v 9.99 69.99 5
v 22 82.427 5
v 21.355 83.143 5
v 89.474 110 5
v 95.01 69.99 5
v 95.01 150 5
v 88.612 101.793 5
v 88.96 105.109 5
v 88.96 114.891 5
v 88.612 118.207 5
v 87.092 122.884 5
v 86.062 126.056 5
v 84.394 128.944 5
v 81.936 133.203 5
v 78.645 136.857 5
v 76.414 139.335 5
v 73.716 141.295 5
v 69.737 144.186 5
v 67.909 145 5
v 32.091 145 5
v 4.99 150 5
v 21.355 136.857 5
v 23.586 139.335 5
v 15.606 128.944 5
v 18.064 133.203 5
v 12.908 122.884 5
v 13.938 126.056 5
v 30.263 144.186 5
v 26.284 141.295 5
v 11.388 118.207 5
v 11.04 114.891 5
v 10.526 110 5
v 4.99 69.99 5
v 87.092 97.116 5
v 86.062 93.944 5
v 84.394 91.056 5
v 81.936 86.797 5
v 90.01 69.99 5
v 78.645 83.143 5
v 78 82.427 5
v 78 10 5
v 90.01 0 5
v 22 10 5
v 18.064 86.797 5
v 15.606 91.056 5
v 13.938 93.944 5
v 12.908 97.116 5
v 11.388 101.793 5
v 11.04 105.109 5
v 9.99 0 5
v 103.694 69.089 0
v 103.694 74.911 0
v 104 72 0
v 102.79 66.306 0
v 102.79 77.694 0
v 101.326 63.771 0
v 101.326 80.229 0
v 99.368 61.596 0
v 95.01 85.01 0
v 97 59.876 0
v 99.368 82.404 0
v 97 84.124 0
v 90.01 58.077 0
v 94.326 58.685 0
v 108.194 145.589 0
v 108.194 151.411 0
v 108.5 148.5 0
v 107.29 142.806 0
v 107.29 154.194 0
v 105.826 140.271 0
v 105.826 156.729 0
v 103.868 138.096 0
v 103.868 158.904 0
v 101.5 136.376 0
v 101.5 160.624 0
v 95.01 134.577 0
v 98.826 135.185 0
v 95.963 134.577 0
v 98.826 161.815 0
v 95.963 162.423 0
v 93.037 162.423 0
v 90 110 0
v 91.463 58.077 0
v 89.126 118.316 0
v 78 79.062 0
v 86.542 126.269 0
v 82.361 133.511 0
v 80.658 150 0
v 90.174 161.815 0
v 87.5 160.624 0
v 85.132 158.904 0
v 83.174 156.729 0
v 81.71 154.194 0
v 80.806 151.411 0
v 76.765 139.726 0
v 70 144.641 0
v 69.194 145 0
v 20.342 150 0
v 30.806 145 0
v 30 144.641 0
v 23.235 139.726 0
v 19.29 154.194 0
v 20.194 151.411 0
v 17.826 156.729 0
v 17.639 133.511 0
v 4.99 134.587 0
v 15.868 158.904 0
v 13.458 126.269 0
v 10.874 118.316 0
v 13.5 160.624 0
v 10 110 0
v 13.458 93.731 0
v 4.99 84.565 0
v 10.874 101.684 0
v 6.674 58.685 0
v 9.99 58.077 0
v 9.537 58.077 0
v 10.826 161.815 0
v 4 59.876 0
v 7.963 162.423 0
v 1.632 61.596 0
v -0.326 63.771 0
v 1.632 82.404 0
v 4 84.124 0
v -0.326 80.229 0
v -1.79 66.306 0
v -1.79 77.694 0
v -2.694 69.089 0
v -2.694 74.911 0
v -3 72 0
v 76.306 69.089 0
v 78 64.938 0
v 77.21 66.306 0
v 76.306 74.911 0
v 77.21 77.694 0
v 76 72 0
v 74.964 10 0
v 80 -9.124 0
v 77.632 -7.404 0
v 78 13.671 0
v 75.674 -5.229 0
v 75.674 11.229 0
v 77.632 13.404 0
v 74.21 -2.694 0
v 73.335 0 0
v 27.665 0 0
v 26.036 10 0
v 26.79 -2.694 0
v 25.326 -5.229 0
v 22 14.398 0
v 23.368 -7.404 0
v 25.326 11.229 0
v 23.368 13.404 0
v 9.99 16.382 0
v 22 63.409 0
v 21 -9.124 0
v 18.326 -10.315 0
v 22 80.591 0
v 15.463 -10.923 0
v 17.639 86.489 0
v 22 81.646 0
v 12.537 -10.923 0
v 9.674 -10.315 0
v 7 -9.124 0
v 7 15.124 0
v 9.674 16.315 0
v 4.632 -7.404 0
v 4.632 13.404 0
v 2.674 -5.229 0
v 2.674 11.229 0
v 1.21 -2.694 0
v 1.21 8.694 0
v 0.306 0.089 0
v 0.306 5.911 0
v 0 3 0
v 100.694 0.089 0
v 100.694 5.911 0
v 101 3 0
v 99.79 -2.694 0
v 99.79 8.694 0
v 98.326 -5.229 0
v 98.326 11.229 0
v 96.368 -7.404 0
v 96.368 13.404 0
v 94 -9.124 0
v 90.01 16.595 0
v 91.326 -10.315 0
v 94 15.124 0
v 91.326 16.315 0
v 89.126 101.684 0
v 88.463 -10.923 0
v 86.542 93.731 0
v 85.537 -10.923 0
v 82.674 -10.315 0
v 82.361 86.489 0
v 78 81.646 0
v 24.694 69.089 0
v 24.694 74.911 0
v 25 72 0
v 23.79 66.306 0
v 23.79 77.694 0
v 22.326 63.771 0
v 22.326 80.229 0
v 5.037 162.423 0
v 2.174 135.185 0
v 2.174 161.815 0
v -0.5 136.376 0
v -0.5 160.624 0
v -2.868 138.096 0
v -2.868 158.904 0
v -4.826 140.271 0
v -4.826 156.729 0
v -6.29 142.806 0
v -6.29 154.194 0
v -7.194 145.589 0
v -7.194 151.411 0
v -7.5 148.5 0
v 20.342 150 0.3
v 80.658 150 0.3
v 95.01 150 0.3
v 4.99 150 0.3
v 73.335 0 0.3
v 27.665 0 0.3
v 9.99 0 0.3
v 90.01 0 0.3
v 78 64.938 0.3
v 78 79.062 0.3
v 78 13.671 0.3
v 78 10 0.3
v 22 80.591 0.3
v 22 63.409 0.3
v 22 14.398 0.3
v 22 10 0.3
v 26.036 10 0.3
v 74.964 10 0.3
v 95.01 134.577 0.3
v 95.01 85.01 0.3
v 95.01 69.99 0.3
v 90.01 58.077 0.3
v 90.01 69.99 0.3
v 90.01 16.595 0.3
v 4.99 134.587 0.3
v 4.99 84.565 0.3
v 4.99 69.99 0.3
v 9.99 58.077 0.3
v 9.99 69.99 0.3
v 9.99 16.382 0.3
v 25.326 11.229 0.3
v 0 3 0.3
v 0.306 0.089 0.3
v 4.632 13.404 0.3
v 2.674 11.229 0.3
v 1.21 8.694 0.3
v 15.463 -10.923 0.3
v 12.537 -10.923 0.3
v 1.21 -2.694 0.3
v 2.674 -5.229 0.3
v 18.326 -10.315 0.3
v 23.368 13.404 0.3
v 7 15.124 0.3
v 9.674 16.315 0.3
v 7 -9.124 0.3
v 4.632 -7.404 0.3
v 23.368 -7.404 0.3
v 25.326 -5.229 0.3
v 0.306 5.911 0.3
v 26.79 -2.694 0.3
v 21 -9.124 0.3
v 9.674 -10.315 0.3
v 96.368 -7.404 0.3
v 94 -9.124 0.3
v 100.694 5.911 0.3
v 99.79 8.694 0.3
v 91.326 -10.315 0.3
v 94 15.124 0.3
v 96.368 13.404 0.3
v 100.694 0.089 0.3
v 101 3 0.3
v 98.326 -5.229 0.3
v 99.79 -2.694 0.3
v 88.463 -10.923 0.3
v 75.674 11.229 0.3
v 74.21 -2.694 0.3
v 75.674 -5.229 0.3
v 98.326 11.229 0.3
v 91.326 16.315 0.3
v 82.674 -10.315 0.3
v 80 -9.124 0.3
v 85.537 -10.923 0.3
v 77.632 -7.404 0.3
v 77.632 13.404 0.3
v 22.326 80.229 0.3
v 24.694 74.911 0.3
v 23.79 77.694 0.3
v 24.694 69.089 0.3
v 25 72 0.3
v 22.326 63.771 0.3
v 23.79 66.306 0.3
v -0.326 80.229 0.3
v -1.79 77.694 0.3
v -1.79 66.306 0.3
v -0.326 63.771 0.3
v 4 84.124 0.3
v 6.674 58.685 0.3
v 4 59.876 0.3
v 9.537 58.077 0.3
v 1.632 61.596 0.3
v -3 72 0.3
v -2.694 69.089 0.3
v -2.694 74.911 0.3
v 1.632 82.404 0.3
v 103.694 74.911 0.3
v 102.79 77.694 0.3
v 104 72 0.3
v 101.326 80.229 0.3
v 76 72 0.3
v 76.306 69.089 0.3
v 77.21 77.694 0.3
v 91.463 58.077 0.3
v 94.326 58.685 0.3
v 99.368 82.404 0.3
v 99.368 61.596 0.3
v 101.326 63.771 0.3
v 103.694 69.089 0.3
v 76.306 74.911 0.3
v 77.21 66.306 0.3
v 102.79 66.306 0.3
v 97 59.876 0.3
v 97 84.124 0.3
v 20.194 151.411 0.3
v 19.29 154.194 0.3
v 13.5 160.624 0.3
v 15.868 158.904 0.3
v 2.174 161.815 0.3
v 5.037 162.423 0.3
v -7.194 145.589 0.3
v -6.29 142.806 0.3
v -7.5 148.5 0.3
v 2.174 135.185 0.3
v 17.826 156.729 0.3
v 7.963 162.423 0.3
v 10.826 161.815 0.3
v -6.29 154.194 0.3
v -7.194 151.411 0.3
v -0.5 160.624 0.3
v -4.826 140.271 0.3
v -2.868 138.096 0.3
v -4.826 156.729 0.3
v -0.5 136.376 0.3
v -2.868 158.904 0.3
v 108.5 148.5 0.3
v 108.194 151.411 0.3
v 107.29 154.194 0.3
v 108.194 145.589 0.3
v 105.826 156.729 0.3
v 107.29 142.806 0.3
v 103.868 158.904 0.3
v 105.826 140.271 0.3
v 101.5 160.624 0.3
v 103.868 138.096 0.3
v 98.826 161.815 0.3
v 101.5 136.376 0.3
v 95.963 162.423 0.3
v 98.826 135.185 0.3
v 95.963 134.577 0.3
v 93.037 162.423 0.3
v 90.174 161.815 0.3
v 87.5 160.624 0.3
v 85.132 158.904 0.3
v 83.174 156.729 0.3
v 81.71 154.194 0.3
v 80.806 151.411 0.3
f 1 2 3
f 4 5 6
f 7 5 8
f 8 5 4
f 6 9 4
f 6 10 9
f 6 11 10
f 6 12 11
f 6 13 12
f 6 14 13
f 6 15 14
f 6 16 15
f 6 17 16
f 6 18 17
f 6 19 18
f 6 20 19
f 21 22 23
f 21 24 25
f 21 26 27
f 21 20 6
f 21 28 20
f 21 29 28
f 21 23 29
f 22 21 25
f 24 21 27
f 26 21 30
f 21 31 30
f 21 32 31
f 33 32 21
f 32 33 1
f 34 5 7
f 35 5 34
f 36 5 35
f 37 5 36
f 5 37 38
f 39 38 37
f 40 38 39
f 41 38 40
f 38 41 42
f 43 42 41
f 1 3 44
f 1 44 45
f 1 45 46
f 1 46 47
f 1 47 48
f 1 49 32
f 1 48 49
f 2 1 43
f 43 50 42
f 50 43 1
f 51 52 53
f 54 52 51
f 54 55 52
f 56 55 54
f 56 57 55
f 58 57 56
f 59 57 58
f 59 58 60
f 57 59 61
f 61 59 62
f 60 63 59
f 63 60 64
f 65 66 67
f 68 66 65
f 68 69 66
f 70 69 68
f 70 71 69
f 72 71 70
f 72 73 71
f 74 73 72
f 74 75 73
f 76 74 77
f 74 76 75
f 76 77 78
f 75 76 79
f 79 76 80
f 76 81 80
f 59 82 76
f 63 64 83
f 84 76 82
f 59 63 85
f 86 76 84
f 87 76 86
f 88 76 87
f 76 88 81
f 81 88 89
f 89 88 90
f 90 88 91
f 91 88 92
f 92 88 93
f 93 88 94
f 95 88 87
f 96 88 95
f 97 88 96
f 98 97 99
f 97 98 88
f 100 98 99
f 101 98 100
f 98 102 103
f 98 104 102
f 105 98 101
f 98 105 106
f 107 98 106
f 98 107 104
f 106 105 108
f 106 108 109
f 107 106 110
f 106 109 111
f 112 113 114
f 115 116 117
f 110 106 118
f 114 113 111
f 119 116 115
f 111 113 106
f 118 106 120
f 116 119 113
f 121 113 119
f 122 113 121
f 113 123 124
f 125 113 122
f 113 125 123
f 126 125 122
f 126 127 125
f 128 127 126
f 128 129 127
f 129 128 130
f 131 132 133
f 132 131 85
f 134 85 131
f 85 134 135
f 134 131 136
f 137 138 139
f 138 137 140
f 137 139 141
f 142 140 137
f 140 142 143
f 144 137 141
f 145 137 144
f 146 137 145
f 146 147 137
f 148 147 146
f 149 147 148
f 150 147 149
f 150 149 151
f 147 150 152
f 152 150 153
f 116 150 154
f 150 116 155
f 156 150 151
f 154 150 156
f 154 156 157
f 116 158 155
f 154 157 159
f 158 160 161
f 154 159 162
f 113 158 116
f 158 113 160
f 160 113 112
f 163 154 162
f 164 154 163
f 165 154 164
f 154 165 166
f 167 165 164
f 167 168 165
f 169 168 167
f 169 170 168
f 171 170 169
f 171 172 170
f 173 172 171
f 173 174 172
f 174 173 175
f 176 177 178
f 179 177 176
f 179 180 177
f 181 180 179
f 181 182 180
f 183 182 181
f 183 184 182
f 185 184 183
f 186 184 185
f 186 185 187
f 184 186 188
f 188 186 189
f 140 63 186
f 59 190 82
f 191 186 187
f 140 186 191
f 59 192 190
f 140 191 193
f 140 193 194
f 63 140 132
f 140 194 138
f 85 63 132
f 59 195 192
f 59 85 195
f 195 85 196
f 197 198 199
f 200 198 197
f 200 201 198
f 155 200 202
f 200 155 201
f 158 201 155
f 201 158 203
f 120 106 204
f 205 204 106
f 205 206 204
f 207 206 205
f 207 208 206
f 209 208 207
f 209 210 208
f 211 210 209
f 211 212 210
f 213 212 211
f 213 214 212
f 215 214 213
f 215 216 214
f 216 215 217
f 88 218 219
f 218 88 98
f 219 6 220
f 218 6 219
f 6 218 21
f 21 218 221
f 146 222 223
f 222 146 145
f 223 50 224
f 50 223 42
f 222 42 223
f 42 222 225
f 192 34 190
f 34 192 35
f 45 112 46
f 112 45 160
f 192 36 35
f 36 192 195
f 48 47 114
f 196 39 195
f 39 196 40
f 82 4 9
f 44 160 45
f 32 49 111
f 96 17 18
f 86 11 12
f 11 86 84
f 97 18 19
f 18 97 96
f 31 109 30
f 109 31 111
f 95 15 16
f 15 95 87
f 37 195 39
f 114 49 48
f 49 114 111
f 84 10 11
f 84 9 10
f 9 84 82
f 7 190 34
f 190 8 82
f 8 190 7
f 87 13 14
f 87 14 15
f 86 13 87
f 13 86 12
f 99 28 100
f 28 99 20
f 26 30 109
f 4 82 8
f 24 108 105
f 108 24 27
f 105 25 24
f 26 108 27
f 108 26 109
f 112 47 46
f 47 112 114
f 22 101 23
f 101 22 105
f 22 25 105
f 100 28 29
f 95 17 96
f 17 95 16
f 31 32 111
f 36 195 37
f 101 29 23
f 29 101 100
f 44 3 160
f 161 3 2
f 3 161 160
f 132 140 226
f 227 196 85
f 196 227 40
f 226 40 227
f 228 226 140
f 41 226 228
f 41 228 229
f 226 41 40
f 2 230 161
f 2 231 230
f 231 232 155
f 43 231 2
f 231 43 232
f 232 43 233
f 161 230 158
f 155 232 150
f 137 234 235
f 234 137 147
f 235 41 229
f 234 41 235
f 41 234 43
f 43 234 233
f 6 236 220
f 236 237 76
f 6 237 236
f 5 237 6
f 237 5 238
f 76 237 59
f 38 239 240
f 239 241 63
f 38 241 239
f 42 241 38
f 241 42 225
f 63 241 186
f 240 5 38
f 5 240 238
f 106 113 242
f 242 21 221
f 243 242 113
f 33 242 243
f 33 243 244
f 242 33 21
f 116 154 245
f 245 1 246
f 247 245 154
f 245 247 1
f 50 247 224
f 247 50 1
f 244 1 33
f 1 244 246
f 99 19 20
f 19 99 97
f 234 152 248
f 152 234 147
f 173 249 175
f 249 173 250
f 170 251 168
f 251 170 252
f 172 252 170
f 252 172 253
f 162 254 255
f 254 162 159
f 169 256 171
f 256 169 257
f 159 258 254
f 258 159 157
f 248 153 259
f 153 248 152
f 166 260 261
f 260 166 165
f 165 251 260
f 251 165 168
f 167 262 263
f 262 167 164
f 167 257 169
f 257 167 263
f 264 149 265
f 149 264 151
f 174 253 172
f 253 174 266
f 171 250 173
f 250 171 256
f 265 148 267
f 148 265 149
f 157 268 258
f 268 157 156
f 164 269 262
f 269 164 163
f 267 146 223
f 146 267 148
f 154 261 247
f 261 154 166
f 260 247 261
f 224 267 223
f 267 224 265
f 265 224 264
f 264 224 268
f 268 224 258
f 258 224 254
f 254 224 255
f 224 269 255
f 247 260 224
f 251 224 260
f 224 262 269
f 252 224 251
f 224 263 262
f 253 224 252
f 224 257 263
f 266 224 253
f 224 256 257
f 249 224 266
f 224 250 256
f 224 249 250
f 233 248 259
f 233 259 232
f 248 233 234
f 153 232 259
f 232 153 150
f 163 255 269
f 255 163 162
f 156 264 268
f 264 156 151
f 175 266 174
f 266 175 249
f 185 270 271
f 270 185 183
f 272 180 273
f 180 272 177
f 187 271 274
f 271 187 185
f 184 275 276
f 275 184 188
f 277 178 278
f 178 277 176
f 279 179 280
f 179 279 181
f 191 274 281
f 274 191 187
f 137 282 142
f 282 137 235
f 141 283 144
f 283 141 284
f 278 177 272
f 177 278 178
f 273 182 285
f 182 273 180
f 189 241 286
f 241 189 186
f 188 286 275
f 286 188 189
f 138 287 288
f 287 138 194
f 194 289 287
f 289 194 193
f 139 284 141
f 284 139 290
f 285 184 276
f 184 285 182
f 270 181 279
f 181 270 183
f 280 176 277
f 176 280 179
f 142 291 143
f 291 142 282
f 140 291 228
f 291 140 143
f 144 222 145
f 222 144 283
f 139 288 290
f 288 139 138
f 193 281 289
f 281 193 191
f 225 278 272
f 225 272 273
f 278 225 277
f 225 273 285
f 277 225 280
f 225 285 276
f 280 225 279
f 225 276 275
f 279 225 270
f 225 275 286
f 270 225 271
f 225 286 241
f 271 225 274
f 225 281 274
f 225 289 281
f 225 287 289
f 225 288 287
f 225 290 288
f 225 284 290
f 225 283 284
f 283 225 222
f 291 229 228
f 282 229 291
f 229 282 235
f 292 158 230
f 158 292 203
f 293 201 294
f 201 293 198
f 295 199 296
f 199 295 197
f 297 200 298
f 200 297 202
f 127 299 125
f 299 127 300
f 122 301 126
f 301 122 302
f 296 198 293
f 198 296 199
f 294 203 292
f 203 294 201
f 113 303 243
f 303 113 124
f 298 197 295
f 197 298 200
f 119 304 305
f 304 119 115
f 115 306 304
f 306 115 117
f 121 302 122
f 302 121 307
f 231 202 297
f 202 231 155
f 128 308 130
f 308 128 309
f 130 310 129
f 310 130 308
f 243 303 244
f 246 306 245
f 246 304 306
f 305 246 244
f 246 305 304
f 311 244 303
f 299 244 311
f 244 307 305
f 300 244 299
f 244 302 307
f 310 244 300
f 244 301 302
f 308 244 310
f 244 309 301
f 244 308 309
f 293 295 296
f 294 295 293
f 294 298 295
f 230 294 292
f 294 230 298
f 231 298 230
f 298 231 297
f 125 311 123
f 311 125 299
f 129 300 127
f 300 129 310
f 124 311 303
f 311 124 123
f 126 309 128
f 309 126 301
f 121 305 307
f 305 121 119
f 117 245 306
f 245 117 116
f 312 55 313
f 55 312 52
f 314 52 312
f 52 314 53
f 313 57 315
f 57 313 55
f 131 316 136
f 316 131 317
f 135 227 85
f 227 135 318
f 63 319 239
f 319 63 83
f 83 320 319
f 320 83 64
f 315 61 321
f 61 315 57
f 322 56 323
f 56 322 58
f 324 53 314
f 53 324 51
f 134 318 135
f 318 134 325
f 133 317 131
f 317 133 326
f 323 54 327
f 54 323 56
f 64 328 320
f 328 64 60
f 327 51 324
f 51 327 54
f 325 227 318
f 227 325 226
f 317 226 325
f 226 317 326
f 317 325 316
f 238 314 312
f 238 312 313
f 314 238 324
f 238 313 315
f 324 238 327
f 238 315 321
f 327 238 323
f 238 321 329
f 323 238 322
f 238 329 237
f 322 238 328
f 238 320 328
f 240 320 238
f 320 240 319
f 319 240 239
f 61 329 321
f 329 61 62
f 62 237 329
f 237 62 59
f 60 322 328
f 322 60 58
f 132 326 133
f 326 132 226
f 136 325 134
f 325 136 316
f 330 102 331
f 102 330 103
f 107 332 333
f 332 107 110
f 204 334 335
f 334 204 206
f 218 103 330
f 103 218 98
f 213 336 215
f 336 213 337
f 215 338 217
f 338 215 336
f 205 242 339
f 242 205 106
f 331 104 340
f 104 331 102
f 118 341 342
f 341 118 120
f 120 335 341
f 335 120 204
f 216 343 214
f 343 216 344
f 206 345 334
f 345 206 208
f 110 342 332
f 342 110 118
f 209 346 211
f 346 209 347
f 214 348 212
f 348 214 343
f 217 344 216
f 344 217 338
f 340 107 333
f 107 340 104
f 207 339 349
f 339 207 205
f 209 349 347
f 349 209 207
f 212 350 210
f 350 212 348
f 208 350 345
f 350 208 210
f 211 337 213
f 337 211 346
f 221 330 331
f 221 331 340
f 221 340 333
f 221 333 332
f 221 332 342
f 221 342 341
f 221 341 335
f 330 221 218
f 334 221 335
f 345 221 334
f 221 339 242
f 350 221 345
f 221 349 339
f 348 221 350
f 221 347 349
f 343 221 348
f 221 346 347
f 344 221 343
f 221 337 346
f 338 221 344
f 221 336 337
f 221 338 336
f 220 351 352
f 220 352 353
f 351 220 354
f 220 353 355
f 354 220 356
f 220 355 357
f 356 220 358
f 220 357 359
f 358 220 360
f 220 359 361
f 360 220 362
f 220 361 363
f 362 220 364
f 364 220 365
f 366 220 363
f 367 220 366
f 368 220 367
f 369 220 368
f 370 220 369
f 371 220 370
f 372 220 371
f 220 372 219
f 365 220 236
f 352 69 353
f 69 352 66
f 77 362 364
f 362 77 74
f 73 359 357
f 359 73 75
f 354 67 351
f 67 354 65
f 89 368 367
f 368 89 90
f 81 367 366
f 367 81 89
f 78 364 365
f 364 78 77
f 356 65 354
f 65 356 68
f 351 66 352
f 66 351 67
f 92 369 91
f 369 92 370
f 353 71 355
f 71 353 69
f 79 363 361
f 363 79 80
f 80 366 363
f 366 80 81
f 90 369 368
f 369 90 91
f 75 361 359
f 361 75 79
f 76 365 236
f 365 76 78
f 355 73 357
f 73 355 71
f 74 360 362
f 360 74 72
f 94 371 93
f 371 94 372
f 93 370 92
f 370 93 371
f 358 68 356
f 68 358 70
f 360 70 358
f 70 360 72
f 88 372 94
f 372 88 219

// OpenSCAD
OX = 0.01;

module lug(height = 0.3) {
	cylinder(r = 14, h = height);
}

union(){
	difference(){
		cube([100, 150, 5]);
		translate([50, 110, 0])
			sphere(40, 40, 40);
		translate([22, 10, -OX])
			cube([56, 56, 5 + 2 * OX]);
		translate([22, 50, -OX])
			cube([56, 56, 5 + 2 * OX]);
		translate([95 + OX, OX, -OX])
			cube([5, 150, 5 + 2 * OX]);
		translate([90 + OX, -OX, -OX])
			cube([10, 70, 5 + 2 * OX]);
		translate([-OX, OX, -OX])
			cube([5, 150, 5 + 2 * OX]);
		translate([-OX, -OX, -OX])
			cube([10, 70, 5 + 2 * OX]);
	}
	// Strengthening:
    translate([5,145])
        cube([90,5,5]);
	// Lugs:
	translate([14, 3, 0]) lug();
	translate([87, 3, 0]) lug();
	translate([11, 72, 0]) lug();
	translate([90, 72, 0]) lug();
	translate([6.5, 148.5, 0]) lug();
	translate([94.5, 148.5, 0]) lug();
}
